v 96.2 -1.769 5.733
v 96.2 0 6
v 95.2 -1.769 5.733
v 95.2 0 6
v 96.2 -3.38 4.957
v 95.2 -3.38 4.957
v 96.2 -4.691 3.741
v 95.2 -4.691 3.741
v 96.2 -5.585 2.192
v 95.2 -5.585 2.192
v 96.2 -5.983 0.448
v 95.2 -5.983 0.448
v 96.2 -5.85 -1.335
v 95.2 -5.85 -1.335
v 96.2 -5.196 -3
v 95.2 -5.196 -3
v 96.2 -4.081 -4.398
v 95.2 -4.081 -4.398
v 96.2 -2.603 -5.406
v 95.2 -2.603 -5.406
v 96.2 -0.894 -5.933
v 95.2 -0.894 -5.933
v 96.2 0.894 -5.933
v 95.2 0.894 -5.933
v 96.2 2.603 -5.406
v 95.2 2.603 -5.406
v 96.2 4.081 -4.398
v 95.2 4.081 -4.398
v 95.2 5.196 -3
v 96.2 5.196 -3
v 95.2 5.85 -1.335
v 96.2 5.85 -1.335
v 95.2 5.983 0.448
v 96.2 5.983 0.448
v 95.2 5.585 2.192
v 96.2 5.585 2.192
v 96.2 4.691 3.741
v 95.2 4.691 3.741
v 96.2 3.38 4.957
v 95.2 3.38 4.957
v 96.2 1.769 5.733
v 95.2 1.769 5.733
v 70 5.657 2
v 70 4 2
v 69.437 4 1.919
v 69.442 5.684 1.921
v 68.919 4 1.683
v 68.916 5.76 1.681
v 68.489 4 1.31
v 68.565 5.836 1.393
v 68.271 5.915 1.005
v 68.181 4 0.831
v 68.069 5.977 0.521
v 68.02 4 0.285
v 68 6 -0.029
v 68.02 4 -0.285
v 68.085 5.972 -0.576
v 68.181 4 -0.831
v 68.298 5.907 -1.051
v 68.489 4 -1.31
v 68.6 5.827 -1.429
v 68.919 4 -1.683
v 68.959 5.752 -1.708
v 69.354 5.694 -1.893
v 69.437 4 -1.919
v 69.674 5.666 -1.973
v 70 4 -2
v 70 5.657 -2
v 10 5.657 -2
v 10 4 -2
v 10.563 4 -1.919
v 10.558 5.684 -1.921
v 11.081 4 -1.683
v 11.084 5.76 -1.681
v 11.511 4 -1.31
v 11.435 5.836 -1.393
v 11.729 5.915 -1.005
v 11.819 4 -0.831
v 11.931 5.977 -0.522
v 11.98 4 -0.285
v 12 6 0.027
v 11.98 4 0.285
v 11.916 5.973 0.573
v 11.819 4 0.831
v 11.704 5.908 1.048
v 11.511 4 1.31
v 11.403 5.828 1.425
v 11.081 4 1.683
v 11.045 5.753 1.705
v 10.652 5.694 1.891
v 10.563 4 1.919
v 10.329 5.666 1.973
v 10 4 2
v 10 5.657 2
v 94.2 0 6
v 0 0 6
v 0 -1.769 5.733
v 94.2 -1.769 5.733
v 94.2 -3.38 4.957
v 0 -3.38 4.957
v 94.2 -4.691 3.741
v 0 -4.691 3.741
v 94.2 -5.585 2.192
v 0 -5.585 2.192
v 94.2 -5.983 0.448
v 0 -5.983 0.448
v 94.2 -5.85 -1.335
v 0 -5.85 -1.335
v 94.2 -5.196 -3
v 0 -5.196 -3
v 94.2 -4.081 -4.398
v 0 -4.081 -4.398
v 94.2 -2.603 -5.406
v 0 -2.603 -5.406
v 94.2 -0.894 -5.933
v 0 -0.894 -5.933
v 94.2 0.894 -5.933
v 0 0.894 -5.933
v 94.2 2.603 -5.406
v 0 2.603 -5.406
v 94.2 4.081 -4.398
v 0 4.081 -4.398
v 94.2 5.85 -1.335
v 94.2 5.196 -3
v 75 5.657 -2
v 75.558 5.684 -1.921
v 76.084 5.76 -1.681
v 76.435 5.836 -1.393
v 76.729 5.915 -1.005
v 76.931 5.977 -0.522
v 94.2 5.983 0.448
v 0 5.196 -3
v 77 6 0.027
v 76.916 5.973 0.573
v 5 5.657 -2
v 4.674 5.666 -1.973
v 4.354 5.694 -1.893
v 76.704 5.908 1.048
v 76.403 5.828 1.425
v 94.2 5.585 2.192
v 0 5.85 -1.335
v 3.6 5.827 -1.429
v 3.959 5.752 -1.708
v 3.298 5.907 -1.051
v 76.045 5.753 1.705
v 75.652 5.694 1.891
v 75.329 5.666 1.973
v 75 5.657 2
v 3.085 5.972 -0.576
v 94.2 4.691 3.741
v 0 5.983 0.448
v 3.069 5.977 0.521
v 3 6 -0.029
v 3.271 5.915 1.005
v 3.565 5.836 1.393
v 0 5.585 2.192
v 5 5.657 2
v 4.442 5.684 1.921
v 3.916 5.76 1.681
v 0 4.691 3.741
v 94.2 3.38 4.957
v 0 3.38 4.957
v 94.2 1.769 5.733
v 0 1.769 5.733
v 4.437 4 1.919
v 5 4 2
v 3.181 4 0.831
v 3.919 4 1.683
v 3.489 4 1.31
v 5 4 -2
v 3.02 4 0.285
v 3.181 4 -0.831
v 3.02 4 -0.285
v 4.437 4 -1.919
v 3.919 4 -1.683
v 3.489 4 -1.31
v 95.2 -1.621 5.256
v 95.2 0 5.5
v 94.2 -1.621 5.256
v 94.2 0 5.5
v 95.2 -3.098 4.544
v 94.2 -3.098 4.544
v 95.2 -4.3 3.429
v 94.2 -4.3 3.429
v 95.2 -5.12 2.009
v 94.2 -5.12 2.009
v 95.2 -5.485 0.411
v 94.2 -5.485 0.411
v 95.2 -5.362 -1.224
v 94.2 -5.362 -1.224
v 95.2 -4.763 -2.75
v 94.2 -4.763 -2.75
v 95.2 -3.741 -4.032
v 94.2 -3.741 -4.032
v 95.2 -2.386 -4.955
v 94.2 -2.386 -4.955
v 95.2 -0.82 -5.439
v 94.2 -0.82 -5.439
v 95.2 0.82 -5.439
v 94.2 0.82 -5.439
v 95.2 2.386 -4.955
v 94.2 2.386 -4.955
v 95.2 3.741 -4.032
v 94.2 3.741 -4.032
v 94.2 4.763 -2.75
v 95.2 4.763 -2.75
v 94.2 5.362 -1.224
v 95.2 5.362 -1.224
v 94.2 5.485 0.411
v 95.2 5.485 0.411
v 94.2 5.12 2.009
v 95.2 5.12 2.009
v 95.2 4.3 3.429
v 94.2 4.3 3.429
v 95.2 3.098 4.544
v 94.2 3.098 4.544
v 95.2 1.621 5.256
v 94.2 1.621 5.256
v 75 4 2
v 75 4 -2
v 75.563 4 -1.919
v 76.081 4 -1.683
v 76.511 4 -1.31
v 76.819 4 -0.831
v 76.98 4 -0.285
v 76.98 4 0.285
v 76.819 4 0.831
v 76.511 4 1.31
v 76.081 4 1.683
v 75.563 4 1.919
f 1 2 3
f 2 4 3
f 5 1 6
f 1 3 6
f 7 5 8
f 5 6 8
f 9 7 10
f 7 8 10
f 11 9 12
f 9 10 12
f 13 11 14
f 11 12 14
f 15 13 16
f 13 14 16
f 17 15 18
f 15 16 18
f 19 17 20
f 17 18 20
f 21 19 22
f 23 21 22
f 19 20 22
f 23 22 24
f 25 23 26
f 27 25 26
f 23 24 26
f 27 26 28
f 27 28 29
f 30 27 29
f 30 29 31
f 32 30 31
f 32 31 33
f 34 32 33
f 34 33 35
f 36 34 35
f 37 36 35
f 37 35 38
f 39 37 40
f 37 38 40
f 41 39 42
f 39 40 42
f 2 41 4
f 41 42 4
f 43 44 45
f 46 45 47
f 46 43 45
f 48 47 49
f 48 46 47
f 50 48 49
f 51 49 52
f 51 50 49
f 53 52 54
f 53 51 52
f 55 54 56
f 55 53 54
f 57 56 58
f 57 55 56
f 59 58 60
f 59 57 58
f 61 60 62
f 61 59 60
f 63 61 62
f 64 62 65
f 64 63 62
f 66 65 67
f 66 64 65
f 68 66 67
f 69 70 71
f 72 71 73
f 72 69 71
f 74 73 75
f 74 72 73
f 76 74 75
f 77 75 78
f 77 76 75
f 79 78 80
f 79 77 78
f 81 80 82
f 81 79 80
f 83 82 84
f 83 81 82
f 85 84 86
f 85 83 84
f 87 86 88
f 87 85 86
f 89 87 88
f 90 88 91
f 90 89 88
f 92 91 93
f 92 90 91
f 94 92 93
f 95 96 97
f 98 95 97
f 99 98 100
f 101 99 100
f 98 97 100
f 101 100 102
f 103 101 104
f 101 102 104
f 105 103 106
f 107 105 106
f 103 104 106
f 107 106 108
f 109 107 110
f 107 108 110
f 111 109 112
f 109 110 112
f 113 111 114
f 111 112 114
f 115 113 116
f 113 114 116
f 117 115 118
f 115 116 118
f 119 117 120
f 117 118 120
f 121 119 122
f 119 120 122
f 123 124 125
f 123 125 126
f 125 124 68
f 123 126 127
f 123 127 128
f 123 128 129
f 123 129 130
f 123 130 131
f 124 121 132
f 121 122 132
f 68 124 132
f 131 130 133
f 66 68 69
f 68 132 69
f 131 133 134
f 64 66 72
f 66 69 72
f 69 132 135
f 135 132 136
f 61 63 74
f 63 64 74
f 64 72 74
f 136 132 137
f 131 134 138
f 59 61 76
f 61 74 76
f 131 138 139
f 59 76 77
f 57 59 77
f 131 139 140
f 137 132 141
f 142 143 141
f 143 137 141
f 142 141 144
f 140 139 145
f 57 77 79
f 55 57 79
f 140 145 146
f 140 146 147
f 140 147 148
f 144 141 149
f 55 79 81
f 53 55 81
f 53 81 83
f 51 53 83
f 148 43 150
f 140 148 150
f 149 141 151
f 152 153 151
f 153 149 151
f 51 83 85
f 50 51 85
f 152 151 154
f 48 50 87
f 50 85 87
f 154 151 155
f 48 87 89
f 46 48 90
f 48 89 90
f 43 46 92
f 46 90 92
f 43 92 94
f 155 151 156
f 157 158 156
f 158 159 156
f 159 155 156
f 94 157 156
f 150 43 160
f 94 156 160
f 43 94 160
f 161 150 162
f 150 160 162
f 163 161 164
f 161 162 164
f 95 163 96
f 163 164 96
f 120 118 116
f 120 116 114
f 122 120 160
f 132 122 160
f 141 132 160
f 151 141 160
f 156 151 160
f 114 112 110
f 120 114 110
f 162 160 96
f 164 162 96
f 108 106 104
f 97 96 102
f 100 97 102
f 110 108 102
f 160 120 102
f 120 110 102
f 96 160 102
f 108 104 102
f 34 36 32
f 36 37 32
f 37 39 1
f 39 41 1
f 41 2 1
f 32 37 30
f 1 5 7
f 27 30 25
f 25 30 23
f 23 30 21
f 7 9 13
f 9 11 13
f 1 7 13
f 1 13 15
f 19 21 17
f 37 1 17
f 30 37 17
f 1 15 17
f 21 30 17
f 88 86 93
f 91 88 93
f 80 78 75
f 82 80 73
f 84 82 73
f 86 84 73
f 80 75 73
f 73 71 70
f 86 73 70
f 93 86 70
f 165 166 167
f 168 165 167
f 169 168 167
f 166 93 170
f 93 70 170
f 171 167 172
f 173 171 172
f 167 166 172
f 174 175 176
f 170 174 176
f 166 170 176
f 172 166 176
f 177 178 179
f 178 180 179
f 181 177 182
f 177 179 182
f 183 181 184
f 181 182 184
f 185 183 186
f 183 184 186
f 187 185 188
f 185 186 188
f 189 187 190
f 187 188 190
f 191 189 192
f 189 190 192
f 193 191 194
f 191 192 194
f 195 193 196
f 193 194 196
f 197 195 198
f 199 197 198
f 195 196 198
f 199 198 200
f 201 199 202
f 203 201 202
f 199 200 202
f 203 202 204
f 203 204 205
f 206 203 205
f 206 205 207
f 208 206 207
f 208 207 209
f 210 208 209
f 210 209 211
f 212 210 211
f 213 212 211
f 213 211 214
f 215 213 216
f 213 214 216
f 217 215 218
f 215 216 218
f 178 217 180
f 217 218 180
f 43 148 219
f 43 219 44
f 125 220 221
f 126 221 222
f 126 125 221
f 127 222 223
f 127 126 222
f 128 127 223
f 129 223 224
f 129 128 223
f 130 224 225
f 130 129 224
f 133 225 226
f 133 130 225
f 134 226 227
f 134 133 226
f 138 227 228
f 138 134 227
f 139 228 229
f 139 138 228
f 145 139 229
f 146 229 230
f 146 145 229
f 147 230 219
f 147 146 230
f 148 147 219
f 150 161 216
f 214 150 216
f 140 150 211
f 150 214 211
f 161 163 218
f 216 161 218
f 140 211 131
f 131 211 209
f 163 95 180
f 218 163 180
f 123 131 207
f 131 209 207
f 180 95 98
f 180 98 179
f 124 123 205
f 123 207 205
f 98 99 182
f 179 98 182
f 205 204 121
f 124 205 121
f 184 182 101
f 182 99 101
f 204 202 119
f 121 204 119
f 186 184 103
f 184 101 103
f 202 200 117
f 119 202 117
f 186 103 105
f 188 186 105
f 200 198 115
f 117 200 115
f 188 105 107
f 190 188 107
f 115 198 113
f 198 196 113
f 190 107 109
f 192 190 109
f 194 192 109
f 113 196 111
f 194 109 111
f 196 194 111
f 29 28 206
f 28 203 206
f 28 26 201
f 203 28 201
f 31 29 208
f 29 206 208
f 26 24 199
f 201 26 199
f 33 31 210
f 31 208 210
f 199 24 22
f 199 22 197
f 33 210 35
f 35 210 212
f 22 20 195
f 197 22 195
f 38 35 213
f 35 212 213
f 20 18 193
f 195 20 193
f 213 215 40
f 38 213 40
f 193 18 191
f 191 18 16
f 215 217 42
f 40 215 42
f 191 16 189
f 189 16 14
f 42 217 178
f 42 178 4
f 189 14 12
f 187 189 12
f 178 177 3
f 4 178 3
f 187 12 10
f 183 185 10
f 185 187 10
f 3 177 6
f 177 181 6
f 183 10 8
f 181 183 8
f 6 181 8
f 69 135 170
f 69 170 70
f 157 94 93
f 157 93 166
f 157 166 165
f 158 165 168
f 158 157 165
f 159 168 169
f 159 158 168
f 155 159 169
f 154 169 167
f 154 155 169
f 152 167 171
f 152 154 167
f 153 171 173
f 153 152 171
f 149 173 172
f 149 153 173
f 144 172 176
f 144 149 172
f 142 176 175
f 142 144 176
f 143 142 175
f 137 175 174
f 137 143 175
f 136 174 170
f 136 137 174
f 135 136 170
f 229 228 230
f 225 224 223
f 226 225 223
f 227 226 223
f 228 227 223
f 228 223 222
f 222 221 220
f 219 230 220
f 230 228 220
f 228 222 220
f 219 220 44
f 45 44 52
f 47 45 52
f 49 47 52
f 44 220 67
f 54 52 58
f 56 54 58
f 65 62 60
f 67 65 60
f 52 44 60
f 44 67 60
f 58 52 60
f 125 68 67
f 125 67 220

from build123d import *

# Parameters (mm, degrees)
CUT_EXTRUDE_1_DEPTH = 2


with BuildPart() as part:
    # ｽｹｯﾁ2 → 回転1 (revolve)
    with BuildSketch(Plane.XY, mode=Mode.PRIVATE) as revolve_1_sk:
        Polygon((0, 6), (0, 0), (96.2, 0), (96.2, 6), (95.2, 6), (95.2, 5.5), (94.2, 5.5), (94.2, 6), (2, 6), (1, 6), align=None)
    revolve(revolve_1_sk.sketch.rotate(Axis((0, 0, 0), (1, 0, 0)), 90), axis=Axis((0, 0, 0), (1, 0, 0)))

    # ｽｹｯﾁ4 → ｶｯﾄ - 押し出し1 (cut)
    with BuildSketch(Plane(origin=(0, 6, 0), x_dir=(1, 0, 0), z_dir=(0, 1, 0))):
        with BuildLine():
            Line((5, 2), (10, 2))
            ThreePointArc((10, 2), (12, 0), (10, -2))
            Line((10, -2), (5, -2))
            ThreePointArc((5, -2), (3, 0), (5, 2))
        make_face()
        with BuildLine():
            Line((75, -2), (70, -2))
            ThreePointArc((70, -2), (68, 0), (70, 2))
            Line((70, 2), (75, 2))
            ThreePointArc((75, 2), (77, 0), (75, -2))
        make_face()
    extrude(amount=-CUT_EXTRUDE_1_DEPTH, mode=Mode.SUBTRACT)


solid = part.part
